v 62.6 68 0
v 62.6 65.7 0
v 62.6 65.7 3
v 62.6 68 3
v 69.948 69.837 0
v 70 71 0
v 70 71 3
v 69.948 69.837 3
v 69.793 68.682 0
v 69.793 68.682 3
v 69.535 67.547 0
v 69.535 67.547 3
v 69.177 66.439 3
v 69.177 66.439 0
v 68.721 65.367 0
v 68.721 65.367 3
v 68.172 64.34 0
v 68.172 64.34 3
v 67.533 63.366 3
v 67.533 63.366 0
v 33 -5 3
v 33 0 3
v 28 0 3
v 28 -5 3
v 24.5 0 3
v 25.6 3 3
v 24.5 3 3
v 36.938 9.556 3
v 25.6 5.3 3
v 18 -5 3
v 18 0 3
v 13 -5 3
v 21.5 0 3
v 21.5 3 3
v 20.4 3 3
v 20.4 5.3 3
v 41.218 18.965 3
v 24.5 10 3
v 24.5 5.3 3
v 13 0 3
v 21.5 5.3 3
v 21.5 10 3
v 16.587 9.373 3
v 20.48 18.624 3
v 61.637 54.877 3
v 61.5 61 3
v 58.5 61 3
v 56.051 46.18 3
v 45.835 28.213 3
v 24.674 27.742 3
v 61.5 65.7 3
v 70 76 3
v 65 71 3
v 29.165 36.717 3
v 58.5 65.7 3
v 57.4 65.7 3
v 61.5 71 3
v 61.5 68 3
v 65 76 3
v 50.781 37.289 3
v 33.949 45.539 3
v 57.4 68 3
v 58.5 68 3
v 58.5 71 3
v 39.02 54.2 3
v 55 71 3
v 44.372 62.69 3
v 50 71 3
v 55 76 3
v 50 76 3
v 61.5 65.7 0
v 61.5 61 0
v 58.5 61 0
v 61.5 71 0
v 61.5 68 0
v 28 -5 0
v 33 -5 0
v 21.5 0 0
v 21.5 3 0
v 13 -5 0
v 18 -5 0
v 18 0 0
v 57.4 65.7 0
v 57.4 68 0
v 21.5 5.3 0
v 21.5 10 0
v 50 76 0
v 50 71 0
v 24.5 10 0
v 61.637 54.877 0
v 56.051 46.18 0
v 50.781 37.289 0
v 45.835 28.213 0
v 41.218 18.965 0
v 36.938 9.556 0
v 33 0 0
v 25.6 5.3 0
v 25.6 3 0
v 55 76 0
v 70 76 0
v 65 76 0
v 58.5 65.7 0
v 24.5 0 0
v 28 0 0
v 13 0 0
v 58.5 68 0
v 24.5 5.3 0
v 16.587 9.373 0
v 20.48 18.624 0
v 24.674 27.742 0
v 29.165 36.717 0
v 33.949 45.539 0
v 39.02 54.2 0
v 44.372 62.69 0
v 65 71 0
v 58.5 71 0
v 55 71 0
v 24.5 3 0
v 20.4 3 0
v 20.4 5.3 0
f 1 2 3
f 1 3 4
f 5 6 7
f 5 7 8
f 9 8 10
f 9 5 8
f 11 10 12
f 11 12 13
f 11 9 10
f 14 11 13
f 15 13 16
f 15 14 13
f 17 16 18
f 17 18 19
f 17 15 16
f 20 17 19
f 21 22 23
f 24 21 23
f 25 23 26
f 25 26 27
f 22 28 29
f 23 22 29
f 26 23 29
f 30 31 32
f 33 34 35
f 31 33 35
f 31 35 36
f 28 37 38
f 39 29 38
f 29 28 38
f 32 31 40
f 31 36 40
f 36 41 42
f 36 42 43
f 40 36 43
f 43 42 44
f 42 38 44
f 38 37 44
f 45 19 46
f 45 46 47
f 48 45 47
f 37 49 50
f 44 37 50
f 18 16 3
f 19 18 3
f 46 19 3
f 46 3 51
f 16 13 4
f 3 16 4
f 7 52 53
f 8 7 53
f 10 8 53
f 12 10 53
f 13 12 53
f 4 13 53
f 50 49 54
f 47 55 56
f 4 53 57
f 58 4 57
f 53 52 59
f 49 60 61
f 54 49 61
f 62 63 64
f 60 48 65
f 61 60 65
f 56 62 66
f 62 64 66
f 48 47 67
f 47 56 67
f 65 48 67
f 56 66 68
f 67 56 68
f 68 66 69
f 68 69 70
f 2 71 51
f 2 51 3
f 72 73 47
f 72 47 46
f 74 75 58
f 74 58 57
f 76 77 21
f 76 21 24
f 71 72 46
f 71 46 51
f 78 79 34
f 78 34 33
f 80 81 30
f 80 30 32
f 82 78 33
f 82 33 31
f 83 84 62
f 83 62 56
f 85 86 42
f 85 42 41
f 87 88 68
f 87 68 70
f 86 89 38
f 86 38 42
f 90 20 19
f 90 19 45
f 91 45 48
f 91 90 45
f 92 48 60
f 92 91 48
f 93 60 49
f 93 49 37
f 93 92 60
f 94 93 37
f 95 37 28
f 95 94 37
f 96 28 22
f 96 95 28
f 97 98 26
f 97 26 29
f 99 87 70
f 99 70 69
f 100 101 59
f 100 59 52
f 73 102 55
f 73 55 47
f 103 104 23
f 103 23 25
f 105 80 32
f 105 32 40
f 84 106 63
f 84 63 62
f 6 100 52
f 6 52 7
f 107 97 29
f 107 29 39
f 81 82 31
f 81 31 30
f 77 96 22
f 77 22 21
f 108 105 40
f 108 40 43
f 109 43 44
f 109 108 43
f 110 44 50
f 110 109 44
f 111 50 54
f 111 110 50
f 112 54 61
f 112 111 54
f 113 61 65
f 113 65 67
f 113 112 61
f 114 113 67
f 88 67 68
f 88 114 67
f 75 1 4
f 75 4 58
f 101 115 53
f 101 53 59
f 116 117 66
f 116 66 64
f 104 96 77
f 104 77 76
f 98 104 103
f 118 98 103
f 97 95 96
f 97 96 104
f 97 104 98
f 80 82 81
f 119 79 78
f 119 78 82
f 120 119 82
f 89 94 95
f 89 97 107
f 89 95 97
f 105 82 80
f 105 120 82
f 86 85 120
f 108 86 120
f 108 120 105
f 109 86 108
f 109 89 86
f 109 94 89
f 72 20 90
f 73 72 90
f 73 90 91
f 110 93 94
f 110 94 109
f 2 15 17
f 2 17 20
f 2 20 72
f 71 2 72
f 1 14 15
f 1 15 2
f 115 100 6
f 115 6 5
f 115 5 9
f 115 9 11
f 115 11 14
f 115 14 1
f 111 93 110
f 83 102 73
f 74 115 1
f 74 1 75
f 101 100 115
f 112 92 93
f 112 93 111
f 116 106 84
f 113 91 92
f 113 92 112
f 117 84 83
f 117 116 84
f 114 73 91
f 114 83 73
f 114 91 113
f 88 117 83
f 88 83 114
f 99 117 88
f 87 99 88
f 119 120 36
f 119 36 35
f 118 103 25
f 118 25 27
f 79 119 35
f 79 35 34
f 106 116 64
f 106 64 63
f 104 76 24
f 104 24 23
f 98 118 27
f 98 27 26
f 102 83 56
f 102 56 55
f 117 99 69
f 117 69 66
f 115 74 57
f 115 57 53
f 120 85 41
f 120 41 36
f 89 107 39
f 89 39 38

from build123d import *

# Parameters (mm, degrees)
BOSS_EXTRUDE1_DEPTH = 3


with BuildPart() as part:
    # Sketch1 → Boss-Extrude1 (new body)
    with BuildSketch(Plane.XY):
        with BuildLine():
            Line((61.5, 71), (65, 71))
            Line((65, 71), (65, 76))
            Line((65, 76), (70, 76))
            Line((70, 76), (70, 71))
            ThreePointArc((70, 71), (69.368032654, 66.988756089), (67.533356838, 63.366129268))
            ThreePointArc((67.533356838, 63.366129268), (48.266790444, 32.772966225), (33, 0))
            Line((33, 0), (33, -5))
            Line((33, -5), (28, -5))
            Line((28, -5), (28, 0))
            Line((28, 0), (24.5, 0))
            Line((24.5, 0), (24.5, 3))
            Line((24.5, 3), (25.6, 3))
            Line((25.6, 3), (25.6, 5.3))
            Line((25.6, 5.3), (24.5, 5.3))
            Line((24.5, 5.3), (24.5, 10))
            Line((24.5, 10), (21.5, 10))
            Line((21.5, 10), (21.5, 5.3))
            Line((21.5, 5.3), (20.4, 5.3))
            Line((20.4, 5.3), (20.4, 3))
            Line((20.4, 3), (21.5, 3))
            Line((21.5, 3), (21.5, 0))
            Line((21.5, 0), (18, 0))
            Line((18, 0), (18, -5))
            Line((18, -5), (13, -5))
            Line((13, -5), (13, 0))
            ThreePointArc((13, 0), (29.165358552, 36.716644135), (50, 71))
            Line((50, 71), (50, 76))
            Line((50, 76), (55, 76))
            Line((55, 76), (55, 71))
            Line((55, 71), (58.5, 71))
            Line((58.5, 71), (58.5, 68))
            Line((58.5, 68), (57.4, 68))
            Line((57.4, 68), (57.4, 65.7))
            Line((57.4, 65.7), (58.5, 65.7))
            Line((58.5, 65.7), (58.5, 61))
            Line((58.5, 61), (61.5, 61))
            Line((61.5, 61), (61.5, 65.7))
            Line((61.5, 65.7), (62.6, 65.7))
            Line((62.6, 65.7), (62.6, 68))
            Line((62.6, 68), (61.5, 68))
            Line((61.5, 68), (61.5, 71))
        make_face()
    extrude(amount=BOSS_EXTRUDE1_DEPTH)


solid = part.part
